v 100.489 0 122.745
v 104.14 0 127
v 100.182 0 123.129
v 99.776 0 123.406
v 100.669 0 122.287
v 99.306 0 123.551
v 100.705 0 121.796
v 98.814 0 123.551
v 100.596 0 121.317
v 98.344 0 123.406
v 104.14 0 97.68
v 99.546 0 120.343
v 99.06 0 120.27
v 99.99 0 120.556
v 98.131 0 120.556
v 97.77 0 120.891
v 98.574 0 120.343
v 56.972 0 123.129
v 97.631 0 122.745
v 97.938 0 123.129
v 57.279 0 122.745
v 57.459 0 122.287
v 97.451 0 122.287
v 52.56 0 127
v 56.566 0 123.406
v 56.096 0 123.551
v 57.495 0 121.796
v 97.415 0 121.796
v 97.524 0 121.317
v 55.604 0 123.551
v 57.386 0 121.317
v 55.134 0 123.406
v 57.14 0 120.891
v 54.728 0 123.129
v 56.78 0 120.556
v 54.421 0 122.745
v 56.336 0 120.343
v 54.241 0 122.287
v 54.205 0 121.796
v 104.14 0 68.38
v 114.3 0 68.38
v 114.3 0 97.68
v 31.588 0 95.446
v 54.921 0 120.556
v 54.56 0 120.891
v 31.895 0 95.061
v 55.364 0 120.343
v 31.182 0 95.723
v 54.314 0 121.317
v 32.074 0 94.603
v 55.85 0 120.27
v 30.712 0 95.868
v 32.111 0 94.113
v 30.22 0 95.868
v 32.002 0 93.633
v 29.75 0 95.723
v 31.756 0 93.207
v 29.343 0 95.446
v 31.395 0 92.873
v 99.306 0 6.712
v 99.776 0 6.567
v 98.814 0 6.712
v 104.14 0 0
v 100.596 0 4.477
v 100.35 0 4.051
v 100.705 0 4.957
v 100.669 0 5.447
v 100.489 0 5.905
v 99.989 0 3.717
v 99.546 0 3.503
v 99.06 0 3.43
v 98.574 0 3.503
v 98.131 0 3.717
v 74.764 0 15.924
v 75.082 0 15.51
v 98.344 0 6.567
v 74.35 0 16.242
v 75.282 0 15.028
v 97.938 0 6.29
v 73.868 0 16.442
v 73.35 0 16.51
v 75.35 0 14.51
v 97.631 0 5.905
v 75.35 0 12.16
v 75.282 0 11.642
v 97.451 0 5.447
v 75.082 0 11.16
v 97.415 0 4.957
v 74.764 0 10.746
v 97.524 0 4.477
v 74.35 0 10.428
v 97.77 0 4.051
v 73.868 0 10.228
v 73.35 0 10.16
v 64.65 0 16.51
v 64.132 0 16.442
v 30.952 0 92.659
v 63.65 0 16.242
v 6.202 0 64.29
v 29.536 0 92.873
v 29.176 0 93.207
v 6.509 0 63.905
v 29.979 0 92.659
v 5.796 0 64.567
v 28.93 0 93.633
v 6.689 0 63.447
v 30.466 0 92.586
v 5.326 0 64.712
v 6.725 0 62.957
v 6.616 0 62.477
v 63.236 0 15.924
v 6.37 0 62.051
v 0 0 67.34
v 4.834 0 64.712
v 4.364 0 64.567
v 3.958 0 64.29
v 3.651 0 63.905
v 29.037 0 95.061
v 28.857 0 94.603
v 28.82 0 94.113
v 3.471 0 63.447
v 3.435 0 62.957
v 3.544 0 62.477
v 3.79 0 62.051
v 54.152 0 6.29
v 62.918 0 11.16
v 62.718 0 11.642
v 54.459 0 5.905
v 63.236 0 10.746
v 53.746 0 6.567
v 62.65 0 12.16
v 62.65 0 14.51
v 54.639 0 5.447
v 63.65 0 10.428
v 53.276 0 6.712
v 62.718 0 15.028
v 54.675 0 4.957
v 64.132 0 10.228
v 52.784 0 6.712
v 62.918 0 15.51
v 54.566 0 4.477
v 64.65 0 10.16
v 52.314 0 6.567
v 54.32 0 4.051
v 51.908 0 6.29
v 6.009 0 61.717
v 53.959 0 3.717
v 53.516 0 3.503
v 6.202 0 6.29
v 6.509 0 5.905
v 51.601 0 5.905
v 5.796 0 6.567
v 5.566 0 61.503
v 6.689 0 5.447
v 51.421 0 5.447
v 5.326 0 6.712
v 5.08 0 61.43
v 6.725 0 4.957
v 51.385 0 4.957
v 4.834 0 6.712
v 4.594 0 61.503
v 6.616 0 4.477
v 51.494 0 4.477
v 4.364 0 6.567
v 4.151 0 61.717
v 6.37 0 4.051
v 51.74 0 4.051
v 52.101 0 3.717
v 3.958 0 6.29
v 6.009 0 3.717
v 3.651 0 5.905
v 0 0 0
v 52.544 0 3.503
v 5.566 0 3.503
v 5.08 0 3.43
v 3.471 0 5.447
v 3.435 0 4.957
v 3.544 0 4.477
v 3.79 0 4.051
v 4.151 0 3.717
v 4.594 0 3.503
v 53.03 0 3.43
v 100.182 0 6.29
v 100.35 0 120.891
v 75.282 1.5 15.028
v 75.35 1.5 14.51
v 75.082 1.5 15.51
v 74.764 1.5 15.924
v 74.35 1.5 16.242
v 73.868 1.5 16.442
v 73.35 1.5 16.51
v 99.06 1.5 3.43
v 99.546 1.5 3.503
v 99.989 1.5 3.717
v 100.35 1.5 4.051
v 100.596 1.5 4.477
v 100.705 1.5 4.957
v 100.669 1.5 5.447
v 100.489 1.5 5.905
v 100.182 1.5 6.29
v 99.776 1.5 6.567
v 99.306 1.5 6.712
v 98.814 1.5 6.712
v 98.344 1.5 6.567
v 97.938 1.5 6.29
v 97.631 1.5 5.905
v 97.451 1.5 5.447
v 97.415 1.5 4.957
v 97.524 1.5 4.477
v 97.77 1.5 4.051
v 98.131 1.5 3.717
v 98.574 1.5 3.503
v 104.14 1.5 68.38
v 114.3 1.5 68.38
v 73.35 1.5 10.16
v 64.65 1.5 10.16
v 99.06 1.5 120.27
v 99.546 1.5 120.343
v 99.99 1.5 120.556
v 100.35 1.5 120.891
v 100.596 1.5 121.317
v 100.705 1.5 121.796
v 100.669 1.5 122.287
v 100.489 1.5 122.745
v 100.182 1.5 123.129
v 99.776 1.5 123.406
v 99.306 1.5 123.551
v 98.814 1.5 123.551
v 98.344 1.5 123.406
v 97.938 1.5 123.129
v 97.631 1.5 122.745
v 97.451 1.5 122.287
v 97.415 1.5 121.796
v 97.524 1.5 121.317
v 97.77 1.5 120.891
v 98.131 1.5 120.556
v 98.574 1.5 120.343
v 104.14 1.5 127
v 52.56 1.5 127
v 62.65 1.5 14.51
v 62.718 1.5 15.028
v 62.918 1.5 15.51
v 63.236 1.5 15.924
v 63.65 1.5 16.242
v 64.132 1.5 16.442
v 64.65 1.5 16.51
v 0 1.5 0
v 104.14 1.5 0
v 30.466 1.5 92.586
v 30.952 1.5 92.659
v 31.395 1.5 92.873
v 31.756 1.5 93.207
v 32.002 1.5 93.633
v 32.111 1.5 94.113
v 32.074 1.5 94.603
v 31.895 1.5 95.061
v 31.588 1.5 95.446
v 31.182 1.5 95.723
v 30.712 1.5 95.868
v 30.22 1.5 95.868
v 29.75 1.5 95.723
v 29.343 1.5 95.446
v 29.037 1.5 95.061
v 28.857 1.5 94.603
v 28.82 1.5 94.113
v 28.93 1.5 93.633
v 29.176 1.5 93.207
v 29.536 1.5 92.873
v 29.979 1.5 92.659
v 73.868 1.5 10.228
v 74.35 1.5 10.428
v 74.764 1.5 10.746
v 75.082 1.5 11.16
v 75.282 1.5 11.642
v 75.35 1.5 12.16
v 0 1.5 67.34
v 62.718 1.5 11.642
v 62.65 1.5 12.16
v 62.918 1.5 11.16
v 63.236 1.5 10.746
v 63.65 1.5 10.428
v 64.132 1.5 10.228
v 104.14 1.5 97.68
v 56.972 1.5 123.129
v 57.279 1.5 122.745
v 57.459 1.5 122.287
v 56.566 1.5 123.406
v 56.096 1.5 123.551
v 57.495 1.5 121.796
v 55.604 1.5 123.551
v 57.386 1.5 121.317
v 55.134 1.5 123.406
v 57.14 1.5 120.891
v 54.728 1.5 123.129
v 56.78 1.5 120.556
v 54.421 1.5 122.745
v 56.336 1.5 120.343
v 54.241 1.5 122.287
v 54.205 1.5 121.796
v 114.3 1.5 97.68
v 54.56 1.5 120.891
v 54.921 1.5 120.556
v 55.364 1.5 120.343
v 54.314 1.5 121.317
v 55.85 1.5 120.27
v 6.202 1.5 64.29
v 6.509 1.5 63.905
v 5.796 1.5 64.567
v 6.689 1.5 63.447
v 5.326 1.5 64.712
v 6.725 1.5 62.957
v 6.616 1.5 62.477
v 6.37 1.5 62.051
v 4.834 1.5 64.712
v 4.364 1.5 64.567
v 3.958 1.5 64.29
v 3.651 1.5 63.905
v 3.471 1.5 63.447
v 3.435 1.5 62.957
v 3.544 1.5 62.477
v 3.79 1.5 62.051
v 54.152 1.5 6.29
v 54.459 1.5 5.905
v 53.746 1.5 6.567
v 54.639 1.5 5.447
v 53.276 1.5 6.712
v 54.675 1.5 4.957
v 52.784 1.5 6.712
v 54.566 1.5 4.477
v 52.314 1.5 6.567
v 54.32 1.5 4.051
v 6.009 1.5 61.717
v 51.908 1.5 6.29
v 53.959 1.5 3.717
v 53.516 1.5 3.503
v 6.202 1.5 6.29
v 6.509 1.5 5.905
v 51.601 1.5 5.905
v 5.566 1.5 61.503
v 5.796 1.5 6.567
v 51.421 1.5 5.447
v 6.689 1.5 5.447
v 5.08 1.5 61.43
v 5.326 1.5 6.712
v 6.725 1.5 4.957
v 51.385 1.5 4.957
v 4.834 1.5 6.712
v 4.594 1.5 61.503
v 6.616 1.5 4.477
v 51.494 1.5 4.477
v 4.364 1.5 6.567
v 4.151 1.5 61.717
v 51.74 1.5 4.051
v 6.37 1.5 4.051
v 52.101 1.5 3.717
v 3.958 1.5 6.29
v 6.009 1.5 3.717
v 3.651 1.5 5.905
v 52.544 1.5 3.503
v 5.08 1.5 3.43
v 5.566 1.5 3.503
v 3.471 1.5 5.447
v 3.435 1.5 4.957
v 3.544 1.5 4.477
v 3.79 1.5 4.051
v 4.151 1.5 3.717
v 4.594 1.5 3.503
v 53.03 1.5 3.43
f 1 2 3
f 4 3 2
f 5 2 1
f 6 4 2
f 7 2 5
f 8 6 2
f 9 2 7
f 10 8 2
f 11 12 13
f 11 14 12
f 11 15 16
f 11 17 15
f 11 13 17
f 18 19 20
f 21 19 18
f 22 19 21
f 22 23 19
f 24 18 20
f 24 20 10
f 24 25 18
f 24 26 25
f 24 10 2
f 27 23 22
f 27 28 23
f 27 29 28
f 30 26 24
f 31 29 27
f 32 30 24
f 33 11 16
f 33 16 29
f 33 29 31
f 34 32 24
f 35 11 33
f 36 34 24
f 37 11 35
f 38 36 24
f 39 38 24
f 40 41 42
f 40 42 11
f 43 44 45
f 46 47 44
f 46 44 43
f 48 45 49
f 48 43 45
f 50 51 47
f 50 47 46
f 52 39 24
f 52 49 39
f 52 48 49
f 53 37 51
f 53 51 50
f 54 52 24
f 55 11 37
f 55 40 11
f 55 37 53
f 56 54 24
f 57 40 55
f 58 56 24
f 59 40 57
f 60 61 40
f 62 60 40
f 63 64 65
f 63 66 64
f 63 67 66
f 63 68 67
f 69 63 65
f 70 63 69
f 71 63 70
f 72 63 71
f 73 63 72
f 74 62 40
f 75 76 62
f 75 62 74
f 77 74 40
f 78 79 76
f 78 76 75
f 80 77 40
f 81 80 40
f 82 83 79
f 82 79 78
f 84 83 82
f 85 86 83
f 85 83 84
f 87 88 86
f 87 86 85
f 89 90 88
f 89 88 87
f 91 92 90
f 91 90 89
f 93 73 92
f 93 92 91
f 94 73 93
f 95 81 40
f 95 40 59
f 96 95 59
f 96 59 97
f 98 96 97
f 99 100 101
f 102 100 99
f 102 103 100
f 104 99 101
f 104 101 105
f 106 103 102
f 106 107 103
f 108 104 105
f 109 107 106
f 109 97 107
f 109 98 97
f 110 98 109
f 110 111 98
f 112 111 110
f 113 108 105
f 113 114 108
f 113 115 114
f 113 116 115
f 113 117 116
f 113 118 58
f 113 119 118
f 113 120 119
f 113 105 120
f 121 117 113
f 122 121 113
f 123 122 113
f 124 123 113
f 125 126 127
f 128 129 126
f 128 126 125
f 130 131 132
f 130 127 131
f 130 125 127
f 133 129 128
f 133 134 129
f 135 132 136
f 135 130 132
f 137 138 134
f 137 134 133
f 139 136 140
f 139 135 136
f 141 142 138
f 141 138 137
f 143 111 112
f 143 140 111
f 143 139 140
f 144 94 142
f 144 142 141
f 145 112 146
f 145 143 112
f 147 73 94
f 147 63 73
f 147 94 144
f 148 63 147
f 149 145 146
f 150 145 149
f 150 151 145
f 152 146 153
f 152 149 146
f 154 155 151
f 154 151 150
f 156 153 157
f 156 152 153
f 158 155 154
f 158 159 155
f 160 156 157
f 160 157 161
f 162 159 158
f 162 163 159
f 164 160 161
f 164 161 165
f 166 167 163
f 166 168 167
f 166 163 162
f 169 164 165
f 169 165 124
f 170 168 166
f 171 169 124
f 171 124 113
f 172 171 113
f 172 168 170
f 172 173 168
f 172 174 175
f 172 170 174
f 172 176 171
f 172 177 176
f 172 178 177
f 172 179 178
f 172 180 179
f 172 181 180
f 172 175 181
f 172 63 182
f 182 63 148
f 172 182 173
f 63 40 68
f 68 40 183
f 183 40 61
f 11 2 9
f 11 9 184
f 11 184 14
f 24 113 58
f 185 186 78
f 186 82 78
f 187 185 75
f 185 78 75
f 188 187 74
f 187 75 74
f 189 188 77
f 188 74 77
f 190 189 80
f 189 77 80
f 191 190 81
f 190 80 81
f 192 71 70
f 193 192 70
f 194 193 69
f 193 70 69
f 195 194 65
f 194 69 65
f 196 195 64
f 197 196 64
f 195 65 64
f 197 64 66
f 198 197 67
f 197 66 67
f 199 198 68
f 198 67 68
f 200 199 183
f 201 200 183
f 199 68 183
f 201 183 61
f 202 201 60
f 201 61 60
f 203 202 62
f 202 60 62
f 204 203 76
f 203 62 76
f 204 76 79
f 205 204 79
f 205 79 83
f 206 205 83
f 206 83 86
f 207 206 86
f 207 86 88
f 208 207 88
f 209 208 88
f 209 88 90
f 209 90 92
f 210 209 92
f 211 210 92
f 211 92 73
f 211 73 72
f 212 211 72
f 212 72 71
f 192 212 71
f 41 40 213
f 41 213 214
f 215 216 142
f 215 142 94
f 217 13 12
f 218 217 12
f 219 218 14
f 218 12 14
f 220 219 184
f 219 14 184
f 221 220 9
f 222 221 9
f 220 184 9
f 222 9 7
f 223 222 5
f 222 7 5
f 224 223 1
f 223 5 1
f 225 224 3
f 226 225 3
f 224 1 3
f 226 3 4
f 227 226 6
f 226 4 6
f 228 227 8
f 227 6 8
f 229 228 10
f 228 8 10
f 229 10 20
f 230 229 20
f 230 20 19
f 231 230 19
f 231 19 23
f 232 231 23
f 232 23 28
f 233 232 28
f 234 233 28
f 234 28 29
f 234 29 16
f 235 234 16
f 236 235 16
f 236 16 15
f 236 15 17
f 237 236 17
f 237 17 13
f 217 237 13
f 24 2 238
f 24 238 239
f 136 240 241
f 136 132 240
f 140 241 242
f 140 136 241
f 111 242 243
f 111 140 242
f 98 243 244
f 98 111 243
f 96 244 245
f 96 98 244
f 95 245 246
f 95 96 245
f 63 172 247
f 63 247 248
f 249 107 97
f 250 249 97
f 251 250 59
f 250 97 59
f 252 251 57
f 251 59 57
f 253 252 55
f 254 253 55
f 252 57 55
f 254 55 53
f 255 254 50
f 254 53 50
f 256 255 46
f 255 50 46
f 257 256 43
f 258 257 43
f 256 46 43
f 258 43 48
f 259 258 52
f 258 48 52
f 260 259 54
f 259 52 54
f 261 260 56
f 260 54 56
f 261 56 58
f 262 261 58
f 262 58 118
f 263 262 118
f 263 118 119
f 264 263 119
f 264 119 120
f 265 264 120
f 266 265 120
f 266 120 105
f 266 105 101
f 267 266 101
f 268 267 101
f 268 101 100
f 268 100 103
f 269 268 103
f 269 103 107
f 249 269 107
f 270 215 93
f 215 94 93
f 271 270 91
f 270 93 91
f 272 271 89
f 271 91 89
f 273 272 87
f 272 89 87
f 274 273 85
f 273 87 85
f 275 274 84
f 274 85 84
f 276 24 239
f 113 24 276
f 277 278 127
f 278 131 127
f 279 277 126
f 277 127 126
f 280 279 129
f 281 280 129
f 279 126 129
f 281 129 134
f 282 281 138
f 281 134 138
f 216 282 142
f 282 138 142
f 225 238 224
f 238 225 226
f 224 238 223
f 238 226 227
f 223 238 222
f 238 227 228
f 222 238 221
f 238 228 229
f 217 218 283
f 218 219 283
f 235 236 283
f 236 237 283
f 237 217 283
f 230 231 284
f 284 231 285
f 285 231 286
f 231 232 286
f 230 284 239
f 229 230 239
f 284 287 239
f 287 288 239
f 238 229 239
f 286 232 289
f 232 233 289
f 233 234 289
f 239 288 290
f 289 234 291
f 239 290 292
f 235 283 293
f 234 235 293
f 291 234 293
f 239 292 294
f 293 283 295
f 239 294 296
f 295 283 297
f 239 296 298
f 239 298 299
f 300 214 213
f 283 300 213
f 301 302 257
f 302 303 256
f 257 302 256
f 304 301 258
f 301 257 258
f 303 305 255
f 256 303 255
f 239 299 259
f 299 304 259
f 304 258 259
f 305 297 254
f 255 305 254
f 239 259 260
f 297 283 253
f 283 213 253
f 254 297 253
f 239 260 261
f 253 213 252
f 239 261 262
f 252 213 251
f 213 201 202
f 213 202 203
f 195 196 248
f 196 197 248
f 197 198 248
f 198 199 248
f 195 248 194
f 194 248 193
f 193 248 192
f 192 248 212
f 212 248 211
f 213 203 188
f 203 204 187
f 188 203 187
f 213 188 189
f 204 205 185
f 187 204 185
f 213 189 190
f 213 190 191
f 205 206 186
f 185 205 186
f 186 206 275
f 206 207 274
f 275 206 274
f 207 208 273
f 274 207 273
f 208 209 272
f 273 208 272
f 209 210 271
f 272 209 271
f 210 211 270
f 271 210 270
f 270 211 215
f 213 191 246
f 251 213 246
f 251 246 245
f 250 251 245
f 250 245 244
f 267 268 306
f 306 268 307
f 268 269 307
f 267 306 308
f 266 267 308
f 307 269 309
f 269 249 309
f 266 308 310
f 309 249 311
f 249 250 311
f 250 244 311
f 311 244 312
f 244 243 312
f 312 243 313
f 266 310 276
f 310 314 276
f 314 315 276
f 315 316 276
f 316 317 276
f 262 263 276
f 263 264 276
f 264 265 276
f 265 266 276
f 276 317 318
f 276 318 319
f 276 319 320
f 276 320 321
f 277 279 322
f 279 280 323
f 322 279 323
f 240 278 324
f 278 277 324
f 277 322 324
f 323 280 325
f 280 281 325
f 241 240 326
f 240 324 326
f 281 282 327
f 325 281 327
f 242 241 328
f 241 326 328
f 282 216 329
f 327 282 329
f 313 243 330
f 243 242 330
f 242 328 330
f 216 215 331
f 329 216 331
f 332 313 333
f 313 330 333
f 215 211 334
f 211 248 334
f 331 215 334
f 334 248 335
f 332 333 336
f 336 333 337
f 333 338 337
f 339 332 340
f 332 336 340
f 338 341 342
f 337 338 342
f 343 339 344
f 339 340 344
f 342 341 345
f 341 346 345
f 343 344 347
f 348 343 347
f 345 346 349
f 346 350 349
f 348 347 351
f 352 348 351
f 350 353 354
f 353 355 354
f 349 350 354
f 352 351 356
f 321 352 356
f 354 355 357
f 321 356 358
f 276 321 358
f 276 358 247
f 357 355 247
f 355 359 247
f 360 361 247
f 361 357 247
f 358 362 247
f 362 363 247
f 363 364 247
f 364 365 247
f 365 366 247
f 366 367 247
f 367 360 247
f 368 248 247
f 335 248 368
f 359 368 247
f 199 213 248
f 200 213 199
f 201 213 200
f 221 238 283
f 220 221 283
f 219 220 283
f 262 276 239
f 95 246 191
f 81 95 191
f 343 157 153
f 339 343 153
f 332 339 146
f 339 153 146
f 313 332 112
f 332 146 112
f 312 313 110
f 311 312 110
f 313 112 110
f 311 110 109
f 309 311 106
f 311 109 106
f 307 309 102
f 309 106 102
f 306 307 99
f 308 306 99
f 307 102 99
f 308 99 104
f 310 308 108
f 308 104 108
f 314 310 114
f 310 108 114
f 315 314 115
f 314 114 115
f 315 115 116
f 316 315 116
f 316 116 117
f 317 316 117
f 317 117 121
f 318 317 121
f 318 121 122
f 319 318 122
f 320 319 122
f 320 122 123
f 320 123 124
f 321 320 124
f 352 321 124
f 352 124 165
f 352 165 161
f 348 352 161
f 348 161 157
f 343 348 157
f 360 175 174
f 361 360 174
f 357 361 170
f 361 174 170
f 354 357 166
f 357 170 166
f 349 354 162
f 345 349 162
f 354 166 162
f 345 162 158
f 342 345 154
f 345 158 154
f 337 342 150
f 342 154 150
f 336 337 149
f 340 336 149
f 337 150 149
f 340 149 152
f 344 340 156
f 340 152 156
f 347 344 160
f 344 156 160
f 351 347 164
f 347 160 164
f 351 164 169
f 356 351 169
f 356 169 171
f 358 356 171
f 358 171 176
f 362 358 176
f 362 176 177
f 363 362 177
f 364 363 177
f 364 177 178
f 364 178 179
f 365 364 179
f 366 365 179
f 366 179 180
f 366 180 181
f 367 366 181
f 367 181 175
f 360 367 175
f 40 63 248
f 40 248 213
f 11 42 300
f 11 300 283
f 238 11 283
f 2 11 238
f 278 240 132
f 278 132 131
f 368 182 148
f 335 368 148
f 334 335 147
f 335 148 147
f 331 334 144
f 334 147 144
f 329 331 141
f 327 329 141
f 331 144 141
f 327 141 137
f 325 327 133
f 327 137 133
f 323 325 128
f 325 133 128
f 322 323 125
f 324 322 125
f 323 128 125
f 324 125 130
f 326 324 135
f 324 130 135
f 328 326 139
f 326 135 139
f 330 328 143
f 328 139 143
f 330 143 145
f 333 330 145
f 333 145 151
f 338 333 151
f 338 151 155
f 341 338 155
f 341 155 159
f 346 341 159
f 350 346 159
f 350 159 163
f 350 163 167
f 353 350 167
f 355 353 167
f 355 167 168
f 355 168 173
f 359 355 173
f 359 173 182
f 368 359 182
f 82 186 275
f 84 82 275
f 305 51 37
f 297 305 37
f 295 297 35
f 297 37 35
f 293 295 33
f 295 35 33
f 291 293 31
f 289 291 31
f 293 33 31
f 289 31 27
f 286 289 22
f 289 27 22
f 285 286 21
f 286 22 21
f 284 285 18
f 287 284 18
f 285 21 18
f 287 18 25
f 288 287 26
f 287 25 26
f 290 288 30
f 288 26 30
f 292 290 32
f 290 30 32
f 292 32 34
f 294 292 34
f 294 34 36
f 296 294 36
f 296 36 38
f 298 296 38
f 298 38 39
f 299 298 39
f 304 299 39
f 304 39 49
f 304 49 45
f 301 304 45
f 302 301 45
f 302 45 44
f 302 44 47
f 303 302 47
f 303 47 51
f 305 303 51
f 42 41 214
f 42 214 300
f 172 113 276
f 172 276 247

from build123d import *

# Parameters (mm, degrees)
BOSS_EXTRUDE1_DEPTH   = 1.5
F_4_0MM_DOWEL_HOLE1_D = 3.3
SKETCH4_W             = 12.7
SKETCH4_H             = 6.35
CUT_EXTRUDE1_DEPTH    = 1.5
FILLET1_R             = 2


with BuildPart() as part:
    # Sketch1 → Boss-Extrude1 (new body)
    with BuildSketch(Plane(origin=(0, 0, 0), x_dir=(1, 0, 0), z_dir=(0, 1, 0))):
        Polygon((0, 0), (104.14, 0), (104.140084457, -68.379681711), (114.300084457, -68.379681711), (114.300084457, -97.679681711), (104.140084457, -97.679681711), (104.140084457, -126.999681711), (52.560084457, -126.999681711), (0, -67.34), align=None)
    extrude(amount=BOSS_EXTRUDE1_DEPTH)

    # Ø4.0mm Dowel Hole1 (through all)
    with Locations(Plane(origin=(5.08, 1.5, 5.08), x_dir=(0, 0, 1), z_dir=(0, 1, 0))):
        with Locations((0, 0), (0, 47.95), (0, 93.980006274), (116.839681711, 93.980084457), (116.839681711, 50.770084457), (89.156056724, 25.385630403), (58, 0)):
            Hole(F_4_0MM_DOWEL_HOLE1_D / 2)

    # Sketch4 → Cut-Extrude1 (cut)
    with BuildSketch(Plane(origin=(0, 1.5, 0), x_dir=(1, 0, 0), z_dir=(0, 1, 0))):
        with Locations((69, -13.335)):
            Rectangle(SKETCH4_W, SKETCH4_H)
    extrude(amount=-CUT_EXTRUDE1_DEPTH, mode=Mode.SUBTRACT)

    # Fillet1
    fillet1_edges = [part.edges().sort_by_distance(p)[0] for p in [
        (62.65, 0.75, 10.16),
        (62.65, 0.75, 16.51),
        (75.35, 0.75, 16.51),
        (75.35, 0.75, 10.16),
    ]]
    fillet(fillet1_edges, radius=FILLET1_R)


solid = part.part
